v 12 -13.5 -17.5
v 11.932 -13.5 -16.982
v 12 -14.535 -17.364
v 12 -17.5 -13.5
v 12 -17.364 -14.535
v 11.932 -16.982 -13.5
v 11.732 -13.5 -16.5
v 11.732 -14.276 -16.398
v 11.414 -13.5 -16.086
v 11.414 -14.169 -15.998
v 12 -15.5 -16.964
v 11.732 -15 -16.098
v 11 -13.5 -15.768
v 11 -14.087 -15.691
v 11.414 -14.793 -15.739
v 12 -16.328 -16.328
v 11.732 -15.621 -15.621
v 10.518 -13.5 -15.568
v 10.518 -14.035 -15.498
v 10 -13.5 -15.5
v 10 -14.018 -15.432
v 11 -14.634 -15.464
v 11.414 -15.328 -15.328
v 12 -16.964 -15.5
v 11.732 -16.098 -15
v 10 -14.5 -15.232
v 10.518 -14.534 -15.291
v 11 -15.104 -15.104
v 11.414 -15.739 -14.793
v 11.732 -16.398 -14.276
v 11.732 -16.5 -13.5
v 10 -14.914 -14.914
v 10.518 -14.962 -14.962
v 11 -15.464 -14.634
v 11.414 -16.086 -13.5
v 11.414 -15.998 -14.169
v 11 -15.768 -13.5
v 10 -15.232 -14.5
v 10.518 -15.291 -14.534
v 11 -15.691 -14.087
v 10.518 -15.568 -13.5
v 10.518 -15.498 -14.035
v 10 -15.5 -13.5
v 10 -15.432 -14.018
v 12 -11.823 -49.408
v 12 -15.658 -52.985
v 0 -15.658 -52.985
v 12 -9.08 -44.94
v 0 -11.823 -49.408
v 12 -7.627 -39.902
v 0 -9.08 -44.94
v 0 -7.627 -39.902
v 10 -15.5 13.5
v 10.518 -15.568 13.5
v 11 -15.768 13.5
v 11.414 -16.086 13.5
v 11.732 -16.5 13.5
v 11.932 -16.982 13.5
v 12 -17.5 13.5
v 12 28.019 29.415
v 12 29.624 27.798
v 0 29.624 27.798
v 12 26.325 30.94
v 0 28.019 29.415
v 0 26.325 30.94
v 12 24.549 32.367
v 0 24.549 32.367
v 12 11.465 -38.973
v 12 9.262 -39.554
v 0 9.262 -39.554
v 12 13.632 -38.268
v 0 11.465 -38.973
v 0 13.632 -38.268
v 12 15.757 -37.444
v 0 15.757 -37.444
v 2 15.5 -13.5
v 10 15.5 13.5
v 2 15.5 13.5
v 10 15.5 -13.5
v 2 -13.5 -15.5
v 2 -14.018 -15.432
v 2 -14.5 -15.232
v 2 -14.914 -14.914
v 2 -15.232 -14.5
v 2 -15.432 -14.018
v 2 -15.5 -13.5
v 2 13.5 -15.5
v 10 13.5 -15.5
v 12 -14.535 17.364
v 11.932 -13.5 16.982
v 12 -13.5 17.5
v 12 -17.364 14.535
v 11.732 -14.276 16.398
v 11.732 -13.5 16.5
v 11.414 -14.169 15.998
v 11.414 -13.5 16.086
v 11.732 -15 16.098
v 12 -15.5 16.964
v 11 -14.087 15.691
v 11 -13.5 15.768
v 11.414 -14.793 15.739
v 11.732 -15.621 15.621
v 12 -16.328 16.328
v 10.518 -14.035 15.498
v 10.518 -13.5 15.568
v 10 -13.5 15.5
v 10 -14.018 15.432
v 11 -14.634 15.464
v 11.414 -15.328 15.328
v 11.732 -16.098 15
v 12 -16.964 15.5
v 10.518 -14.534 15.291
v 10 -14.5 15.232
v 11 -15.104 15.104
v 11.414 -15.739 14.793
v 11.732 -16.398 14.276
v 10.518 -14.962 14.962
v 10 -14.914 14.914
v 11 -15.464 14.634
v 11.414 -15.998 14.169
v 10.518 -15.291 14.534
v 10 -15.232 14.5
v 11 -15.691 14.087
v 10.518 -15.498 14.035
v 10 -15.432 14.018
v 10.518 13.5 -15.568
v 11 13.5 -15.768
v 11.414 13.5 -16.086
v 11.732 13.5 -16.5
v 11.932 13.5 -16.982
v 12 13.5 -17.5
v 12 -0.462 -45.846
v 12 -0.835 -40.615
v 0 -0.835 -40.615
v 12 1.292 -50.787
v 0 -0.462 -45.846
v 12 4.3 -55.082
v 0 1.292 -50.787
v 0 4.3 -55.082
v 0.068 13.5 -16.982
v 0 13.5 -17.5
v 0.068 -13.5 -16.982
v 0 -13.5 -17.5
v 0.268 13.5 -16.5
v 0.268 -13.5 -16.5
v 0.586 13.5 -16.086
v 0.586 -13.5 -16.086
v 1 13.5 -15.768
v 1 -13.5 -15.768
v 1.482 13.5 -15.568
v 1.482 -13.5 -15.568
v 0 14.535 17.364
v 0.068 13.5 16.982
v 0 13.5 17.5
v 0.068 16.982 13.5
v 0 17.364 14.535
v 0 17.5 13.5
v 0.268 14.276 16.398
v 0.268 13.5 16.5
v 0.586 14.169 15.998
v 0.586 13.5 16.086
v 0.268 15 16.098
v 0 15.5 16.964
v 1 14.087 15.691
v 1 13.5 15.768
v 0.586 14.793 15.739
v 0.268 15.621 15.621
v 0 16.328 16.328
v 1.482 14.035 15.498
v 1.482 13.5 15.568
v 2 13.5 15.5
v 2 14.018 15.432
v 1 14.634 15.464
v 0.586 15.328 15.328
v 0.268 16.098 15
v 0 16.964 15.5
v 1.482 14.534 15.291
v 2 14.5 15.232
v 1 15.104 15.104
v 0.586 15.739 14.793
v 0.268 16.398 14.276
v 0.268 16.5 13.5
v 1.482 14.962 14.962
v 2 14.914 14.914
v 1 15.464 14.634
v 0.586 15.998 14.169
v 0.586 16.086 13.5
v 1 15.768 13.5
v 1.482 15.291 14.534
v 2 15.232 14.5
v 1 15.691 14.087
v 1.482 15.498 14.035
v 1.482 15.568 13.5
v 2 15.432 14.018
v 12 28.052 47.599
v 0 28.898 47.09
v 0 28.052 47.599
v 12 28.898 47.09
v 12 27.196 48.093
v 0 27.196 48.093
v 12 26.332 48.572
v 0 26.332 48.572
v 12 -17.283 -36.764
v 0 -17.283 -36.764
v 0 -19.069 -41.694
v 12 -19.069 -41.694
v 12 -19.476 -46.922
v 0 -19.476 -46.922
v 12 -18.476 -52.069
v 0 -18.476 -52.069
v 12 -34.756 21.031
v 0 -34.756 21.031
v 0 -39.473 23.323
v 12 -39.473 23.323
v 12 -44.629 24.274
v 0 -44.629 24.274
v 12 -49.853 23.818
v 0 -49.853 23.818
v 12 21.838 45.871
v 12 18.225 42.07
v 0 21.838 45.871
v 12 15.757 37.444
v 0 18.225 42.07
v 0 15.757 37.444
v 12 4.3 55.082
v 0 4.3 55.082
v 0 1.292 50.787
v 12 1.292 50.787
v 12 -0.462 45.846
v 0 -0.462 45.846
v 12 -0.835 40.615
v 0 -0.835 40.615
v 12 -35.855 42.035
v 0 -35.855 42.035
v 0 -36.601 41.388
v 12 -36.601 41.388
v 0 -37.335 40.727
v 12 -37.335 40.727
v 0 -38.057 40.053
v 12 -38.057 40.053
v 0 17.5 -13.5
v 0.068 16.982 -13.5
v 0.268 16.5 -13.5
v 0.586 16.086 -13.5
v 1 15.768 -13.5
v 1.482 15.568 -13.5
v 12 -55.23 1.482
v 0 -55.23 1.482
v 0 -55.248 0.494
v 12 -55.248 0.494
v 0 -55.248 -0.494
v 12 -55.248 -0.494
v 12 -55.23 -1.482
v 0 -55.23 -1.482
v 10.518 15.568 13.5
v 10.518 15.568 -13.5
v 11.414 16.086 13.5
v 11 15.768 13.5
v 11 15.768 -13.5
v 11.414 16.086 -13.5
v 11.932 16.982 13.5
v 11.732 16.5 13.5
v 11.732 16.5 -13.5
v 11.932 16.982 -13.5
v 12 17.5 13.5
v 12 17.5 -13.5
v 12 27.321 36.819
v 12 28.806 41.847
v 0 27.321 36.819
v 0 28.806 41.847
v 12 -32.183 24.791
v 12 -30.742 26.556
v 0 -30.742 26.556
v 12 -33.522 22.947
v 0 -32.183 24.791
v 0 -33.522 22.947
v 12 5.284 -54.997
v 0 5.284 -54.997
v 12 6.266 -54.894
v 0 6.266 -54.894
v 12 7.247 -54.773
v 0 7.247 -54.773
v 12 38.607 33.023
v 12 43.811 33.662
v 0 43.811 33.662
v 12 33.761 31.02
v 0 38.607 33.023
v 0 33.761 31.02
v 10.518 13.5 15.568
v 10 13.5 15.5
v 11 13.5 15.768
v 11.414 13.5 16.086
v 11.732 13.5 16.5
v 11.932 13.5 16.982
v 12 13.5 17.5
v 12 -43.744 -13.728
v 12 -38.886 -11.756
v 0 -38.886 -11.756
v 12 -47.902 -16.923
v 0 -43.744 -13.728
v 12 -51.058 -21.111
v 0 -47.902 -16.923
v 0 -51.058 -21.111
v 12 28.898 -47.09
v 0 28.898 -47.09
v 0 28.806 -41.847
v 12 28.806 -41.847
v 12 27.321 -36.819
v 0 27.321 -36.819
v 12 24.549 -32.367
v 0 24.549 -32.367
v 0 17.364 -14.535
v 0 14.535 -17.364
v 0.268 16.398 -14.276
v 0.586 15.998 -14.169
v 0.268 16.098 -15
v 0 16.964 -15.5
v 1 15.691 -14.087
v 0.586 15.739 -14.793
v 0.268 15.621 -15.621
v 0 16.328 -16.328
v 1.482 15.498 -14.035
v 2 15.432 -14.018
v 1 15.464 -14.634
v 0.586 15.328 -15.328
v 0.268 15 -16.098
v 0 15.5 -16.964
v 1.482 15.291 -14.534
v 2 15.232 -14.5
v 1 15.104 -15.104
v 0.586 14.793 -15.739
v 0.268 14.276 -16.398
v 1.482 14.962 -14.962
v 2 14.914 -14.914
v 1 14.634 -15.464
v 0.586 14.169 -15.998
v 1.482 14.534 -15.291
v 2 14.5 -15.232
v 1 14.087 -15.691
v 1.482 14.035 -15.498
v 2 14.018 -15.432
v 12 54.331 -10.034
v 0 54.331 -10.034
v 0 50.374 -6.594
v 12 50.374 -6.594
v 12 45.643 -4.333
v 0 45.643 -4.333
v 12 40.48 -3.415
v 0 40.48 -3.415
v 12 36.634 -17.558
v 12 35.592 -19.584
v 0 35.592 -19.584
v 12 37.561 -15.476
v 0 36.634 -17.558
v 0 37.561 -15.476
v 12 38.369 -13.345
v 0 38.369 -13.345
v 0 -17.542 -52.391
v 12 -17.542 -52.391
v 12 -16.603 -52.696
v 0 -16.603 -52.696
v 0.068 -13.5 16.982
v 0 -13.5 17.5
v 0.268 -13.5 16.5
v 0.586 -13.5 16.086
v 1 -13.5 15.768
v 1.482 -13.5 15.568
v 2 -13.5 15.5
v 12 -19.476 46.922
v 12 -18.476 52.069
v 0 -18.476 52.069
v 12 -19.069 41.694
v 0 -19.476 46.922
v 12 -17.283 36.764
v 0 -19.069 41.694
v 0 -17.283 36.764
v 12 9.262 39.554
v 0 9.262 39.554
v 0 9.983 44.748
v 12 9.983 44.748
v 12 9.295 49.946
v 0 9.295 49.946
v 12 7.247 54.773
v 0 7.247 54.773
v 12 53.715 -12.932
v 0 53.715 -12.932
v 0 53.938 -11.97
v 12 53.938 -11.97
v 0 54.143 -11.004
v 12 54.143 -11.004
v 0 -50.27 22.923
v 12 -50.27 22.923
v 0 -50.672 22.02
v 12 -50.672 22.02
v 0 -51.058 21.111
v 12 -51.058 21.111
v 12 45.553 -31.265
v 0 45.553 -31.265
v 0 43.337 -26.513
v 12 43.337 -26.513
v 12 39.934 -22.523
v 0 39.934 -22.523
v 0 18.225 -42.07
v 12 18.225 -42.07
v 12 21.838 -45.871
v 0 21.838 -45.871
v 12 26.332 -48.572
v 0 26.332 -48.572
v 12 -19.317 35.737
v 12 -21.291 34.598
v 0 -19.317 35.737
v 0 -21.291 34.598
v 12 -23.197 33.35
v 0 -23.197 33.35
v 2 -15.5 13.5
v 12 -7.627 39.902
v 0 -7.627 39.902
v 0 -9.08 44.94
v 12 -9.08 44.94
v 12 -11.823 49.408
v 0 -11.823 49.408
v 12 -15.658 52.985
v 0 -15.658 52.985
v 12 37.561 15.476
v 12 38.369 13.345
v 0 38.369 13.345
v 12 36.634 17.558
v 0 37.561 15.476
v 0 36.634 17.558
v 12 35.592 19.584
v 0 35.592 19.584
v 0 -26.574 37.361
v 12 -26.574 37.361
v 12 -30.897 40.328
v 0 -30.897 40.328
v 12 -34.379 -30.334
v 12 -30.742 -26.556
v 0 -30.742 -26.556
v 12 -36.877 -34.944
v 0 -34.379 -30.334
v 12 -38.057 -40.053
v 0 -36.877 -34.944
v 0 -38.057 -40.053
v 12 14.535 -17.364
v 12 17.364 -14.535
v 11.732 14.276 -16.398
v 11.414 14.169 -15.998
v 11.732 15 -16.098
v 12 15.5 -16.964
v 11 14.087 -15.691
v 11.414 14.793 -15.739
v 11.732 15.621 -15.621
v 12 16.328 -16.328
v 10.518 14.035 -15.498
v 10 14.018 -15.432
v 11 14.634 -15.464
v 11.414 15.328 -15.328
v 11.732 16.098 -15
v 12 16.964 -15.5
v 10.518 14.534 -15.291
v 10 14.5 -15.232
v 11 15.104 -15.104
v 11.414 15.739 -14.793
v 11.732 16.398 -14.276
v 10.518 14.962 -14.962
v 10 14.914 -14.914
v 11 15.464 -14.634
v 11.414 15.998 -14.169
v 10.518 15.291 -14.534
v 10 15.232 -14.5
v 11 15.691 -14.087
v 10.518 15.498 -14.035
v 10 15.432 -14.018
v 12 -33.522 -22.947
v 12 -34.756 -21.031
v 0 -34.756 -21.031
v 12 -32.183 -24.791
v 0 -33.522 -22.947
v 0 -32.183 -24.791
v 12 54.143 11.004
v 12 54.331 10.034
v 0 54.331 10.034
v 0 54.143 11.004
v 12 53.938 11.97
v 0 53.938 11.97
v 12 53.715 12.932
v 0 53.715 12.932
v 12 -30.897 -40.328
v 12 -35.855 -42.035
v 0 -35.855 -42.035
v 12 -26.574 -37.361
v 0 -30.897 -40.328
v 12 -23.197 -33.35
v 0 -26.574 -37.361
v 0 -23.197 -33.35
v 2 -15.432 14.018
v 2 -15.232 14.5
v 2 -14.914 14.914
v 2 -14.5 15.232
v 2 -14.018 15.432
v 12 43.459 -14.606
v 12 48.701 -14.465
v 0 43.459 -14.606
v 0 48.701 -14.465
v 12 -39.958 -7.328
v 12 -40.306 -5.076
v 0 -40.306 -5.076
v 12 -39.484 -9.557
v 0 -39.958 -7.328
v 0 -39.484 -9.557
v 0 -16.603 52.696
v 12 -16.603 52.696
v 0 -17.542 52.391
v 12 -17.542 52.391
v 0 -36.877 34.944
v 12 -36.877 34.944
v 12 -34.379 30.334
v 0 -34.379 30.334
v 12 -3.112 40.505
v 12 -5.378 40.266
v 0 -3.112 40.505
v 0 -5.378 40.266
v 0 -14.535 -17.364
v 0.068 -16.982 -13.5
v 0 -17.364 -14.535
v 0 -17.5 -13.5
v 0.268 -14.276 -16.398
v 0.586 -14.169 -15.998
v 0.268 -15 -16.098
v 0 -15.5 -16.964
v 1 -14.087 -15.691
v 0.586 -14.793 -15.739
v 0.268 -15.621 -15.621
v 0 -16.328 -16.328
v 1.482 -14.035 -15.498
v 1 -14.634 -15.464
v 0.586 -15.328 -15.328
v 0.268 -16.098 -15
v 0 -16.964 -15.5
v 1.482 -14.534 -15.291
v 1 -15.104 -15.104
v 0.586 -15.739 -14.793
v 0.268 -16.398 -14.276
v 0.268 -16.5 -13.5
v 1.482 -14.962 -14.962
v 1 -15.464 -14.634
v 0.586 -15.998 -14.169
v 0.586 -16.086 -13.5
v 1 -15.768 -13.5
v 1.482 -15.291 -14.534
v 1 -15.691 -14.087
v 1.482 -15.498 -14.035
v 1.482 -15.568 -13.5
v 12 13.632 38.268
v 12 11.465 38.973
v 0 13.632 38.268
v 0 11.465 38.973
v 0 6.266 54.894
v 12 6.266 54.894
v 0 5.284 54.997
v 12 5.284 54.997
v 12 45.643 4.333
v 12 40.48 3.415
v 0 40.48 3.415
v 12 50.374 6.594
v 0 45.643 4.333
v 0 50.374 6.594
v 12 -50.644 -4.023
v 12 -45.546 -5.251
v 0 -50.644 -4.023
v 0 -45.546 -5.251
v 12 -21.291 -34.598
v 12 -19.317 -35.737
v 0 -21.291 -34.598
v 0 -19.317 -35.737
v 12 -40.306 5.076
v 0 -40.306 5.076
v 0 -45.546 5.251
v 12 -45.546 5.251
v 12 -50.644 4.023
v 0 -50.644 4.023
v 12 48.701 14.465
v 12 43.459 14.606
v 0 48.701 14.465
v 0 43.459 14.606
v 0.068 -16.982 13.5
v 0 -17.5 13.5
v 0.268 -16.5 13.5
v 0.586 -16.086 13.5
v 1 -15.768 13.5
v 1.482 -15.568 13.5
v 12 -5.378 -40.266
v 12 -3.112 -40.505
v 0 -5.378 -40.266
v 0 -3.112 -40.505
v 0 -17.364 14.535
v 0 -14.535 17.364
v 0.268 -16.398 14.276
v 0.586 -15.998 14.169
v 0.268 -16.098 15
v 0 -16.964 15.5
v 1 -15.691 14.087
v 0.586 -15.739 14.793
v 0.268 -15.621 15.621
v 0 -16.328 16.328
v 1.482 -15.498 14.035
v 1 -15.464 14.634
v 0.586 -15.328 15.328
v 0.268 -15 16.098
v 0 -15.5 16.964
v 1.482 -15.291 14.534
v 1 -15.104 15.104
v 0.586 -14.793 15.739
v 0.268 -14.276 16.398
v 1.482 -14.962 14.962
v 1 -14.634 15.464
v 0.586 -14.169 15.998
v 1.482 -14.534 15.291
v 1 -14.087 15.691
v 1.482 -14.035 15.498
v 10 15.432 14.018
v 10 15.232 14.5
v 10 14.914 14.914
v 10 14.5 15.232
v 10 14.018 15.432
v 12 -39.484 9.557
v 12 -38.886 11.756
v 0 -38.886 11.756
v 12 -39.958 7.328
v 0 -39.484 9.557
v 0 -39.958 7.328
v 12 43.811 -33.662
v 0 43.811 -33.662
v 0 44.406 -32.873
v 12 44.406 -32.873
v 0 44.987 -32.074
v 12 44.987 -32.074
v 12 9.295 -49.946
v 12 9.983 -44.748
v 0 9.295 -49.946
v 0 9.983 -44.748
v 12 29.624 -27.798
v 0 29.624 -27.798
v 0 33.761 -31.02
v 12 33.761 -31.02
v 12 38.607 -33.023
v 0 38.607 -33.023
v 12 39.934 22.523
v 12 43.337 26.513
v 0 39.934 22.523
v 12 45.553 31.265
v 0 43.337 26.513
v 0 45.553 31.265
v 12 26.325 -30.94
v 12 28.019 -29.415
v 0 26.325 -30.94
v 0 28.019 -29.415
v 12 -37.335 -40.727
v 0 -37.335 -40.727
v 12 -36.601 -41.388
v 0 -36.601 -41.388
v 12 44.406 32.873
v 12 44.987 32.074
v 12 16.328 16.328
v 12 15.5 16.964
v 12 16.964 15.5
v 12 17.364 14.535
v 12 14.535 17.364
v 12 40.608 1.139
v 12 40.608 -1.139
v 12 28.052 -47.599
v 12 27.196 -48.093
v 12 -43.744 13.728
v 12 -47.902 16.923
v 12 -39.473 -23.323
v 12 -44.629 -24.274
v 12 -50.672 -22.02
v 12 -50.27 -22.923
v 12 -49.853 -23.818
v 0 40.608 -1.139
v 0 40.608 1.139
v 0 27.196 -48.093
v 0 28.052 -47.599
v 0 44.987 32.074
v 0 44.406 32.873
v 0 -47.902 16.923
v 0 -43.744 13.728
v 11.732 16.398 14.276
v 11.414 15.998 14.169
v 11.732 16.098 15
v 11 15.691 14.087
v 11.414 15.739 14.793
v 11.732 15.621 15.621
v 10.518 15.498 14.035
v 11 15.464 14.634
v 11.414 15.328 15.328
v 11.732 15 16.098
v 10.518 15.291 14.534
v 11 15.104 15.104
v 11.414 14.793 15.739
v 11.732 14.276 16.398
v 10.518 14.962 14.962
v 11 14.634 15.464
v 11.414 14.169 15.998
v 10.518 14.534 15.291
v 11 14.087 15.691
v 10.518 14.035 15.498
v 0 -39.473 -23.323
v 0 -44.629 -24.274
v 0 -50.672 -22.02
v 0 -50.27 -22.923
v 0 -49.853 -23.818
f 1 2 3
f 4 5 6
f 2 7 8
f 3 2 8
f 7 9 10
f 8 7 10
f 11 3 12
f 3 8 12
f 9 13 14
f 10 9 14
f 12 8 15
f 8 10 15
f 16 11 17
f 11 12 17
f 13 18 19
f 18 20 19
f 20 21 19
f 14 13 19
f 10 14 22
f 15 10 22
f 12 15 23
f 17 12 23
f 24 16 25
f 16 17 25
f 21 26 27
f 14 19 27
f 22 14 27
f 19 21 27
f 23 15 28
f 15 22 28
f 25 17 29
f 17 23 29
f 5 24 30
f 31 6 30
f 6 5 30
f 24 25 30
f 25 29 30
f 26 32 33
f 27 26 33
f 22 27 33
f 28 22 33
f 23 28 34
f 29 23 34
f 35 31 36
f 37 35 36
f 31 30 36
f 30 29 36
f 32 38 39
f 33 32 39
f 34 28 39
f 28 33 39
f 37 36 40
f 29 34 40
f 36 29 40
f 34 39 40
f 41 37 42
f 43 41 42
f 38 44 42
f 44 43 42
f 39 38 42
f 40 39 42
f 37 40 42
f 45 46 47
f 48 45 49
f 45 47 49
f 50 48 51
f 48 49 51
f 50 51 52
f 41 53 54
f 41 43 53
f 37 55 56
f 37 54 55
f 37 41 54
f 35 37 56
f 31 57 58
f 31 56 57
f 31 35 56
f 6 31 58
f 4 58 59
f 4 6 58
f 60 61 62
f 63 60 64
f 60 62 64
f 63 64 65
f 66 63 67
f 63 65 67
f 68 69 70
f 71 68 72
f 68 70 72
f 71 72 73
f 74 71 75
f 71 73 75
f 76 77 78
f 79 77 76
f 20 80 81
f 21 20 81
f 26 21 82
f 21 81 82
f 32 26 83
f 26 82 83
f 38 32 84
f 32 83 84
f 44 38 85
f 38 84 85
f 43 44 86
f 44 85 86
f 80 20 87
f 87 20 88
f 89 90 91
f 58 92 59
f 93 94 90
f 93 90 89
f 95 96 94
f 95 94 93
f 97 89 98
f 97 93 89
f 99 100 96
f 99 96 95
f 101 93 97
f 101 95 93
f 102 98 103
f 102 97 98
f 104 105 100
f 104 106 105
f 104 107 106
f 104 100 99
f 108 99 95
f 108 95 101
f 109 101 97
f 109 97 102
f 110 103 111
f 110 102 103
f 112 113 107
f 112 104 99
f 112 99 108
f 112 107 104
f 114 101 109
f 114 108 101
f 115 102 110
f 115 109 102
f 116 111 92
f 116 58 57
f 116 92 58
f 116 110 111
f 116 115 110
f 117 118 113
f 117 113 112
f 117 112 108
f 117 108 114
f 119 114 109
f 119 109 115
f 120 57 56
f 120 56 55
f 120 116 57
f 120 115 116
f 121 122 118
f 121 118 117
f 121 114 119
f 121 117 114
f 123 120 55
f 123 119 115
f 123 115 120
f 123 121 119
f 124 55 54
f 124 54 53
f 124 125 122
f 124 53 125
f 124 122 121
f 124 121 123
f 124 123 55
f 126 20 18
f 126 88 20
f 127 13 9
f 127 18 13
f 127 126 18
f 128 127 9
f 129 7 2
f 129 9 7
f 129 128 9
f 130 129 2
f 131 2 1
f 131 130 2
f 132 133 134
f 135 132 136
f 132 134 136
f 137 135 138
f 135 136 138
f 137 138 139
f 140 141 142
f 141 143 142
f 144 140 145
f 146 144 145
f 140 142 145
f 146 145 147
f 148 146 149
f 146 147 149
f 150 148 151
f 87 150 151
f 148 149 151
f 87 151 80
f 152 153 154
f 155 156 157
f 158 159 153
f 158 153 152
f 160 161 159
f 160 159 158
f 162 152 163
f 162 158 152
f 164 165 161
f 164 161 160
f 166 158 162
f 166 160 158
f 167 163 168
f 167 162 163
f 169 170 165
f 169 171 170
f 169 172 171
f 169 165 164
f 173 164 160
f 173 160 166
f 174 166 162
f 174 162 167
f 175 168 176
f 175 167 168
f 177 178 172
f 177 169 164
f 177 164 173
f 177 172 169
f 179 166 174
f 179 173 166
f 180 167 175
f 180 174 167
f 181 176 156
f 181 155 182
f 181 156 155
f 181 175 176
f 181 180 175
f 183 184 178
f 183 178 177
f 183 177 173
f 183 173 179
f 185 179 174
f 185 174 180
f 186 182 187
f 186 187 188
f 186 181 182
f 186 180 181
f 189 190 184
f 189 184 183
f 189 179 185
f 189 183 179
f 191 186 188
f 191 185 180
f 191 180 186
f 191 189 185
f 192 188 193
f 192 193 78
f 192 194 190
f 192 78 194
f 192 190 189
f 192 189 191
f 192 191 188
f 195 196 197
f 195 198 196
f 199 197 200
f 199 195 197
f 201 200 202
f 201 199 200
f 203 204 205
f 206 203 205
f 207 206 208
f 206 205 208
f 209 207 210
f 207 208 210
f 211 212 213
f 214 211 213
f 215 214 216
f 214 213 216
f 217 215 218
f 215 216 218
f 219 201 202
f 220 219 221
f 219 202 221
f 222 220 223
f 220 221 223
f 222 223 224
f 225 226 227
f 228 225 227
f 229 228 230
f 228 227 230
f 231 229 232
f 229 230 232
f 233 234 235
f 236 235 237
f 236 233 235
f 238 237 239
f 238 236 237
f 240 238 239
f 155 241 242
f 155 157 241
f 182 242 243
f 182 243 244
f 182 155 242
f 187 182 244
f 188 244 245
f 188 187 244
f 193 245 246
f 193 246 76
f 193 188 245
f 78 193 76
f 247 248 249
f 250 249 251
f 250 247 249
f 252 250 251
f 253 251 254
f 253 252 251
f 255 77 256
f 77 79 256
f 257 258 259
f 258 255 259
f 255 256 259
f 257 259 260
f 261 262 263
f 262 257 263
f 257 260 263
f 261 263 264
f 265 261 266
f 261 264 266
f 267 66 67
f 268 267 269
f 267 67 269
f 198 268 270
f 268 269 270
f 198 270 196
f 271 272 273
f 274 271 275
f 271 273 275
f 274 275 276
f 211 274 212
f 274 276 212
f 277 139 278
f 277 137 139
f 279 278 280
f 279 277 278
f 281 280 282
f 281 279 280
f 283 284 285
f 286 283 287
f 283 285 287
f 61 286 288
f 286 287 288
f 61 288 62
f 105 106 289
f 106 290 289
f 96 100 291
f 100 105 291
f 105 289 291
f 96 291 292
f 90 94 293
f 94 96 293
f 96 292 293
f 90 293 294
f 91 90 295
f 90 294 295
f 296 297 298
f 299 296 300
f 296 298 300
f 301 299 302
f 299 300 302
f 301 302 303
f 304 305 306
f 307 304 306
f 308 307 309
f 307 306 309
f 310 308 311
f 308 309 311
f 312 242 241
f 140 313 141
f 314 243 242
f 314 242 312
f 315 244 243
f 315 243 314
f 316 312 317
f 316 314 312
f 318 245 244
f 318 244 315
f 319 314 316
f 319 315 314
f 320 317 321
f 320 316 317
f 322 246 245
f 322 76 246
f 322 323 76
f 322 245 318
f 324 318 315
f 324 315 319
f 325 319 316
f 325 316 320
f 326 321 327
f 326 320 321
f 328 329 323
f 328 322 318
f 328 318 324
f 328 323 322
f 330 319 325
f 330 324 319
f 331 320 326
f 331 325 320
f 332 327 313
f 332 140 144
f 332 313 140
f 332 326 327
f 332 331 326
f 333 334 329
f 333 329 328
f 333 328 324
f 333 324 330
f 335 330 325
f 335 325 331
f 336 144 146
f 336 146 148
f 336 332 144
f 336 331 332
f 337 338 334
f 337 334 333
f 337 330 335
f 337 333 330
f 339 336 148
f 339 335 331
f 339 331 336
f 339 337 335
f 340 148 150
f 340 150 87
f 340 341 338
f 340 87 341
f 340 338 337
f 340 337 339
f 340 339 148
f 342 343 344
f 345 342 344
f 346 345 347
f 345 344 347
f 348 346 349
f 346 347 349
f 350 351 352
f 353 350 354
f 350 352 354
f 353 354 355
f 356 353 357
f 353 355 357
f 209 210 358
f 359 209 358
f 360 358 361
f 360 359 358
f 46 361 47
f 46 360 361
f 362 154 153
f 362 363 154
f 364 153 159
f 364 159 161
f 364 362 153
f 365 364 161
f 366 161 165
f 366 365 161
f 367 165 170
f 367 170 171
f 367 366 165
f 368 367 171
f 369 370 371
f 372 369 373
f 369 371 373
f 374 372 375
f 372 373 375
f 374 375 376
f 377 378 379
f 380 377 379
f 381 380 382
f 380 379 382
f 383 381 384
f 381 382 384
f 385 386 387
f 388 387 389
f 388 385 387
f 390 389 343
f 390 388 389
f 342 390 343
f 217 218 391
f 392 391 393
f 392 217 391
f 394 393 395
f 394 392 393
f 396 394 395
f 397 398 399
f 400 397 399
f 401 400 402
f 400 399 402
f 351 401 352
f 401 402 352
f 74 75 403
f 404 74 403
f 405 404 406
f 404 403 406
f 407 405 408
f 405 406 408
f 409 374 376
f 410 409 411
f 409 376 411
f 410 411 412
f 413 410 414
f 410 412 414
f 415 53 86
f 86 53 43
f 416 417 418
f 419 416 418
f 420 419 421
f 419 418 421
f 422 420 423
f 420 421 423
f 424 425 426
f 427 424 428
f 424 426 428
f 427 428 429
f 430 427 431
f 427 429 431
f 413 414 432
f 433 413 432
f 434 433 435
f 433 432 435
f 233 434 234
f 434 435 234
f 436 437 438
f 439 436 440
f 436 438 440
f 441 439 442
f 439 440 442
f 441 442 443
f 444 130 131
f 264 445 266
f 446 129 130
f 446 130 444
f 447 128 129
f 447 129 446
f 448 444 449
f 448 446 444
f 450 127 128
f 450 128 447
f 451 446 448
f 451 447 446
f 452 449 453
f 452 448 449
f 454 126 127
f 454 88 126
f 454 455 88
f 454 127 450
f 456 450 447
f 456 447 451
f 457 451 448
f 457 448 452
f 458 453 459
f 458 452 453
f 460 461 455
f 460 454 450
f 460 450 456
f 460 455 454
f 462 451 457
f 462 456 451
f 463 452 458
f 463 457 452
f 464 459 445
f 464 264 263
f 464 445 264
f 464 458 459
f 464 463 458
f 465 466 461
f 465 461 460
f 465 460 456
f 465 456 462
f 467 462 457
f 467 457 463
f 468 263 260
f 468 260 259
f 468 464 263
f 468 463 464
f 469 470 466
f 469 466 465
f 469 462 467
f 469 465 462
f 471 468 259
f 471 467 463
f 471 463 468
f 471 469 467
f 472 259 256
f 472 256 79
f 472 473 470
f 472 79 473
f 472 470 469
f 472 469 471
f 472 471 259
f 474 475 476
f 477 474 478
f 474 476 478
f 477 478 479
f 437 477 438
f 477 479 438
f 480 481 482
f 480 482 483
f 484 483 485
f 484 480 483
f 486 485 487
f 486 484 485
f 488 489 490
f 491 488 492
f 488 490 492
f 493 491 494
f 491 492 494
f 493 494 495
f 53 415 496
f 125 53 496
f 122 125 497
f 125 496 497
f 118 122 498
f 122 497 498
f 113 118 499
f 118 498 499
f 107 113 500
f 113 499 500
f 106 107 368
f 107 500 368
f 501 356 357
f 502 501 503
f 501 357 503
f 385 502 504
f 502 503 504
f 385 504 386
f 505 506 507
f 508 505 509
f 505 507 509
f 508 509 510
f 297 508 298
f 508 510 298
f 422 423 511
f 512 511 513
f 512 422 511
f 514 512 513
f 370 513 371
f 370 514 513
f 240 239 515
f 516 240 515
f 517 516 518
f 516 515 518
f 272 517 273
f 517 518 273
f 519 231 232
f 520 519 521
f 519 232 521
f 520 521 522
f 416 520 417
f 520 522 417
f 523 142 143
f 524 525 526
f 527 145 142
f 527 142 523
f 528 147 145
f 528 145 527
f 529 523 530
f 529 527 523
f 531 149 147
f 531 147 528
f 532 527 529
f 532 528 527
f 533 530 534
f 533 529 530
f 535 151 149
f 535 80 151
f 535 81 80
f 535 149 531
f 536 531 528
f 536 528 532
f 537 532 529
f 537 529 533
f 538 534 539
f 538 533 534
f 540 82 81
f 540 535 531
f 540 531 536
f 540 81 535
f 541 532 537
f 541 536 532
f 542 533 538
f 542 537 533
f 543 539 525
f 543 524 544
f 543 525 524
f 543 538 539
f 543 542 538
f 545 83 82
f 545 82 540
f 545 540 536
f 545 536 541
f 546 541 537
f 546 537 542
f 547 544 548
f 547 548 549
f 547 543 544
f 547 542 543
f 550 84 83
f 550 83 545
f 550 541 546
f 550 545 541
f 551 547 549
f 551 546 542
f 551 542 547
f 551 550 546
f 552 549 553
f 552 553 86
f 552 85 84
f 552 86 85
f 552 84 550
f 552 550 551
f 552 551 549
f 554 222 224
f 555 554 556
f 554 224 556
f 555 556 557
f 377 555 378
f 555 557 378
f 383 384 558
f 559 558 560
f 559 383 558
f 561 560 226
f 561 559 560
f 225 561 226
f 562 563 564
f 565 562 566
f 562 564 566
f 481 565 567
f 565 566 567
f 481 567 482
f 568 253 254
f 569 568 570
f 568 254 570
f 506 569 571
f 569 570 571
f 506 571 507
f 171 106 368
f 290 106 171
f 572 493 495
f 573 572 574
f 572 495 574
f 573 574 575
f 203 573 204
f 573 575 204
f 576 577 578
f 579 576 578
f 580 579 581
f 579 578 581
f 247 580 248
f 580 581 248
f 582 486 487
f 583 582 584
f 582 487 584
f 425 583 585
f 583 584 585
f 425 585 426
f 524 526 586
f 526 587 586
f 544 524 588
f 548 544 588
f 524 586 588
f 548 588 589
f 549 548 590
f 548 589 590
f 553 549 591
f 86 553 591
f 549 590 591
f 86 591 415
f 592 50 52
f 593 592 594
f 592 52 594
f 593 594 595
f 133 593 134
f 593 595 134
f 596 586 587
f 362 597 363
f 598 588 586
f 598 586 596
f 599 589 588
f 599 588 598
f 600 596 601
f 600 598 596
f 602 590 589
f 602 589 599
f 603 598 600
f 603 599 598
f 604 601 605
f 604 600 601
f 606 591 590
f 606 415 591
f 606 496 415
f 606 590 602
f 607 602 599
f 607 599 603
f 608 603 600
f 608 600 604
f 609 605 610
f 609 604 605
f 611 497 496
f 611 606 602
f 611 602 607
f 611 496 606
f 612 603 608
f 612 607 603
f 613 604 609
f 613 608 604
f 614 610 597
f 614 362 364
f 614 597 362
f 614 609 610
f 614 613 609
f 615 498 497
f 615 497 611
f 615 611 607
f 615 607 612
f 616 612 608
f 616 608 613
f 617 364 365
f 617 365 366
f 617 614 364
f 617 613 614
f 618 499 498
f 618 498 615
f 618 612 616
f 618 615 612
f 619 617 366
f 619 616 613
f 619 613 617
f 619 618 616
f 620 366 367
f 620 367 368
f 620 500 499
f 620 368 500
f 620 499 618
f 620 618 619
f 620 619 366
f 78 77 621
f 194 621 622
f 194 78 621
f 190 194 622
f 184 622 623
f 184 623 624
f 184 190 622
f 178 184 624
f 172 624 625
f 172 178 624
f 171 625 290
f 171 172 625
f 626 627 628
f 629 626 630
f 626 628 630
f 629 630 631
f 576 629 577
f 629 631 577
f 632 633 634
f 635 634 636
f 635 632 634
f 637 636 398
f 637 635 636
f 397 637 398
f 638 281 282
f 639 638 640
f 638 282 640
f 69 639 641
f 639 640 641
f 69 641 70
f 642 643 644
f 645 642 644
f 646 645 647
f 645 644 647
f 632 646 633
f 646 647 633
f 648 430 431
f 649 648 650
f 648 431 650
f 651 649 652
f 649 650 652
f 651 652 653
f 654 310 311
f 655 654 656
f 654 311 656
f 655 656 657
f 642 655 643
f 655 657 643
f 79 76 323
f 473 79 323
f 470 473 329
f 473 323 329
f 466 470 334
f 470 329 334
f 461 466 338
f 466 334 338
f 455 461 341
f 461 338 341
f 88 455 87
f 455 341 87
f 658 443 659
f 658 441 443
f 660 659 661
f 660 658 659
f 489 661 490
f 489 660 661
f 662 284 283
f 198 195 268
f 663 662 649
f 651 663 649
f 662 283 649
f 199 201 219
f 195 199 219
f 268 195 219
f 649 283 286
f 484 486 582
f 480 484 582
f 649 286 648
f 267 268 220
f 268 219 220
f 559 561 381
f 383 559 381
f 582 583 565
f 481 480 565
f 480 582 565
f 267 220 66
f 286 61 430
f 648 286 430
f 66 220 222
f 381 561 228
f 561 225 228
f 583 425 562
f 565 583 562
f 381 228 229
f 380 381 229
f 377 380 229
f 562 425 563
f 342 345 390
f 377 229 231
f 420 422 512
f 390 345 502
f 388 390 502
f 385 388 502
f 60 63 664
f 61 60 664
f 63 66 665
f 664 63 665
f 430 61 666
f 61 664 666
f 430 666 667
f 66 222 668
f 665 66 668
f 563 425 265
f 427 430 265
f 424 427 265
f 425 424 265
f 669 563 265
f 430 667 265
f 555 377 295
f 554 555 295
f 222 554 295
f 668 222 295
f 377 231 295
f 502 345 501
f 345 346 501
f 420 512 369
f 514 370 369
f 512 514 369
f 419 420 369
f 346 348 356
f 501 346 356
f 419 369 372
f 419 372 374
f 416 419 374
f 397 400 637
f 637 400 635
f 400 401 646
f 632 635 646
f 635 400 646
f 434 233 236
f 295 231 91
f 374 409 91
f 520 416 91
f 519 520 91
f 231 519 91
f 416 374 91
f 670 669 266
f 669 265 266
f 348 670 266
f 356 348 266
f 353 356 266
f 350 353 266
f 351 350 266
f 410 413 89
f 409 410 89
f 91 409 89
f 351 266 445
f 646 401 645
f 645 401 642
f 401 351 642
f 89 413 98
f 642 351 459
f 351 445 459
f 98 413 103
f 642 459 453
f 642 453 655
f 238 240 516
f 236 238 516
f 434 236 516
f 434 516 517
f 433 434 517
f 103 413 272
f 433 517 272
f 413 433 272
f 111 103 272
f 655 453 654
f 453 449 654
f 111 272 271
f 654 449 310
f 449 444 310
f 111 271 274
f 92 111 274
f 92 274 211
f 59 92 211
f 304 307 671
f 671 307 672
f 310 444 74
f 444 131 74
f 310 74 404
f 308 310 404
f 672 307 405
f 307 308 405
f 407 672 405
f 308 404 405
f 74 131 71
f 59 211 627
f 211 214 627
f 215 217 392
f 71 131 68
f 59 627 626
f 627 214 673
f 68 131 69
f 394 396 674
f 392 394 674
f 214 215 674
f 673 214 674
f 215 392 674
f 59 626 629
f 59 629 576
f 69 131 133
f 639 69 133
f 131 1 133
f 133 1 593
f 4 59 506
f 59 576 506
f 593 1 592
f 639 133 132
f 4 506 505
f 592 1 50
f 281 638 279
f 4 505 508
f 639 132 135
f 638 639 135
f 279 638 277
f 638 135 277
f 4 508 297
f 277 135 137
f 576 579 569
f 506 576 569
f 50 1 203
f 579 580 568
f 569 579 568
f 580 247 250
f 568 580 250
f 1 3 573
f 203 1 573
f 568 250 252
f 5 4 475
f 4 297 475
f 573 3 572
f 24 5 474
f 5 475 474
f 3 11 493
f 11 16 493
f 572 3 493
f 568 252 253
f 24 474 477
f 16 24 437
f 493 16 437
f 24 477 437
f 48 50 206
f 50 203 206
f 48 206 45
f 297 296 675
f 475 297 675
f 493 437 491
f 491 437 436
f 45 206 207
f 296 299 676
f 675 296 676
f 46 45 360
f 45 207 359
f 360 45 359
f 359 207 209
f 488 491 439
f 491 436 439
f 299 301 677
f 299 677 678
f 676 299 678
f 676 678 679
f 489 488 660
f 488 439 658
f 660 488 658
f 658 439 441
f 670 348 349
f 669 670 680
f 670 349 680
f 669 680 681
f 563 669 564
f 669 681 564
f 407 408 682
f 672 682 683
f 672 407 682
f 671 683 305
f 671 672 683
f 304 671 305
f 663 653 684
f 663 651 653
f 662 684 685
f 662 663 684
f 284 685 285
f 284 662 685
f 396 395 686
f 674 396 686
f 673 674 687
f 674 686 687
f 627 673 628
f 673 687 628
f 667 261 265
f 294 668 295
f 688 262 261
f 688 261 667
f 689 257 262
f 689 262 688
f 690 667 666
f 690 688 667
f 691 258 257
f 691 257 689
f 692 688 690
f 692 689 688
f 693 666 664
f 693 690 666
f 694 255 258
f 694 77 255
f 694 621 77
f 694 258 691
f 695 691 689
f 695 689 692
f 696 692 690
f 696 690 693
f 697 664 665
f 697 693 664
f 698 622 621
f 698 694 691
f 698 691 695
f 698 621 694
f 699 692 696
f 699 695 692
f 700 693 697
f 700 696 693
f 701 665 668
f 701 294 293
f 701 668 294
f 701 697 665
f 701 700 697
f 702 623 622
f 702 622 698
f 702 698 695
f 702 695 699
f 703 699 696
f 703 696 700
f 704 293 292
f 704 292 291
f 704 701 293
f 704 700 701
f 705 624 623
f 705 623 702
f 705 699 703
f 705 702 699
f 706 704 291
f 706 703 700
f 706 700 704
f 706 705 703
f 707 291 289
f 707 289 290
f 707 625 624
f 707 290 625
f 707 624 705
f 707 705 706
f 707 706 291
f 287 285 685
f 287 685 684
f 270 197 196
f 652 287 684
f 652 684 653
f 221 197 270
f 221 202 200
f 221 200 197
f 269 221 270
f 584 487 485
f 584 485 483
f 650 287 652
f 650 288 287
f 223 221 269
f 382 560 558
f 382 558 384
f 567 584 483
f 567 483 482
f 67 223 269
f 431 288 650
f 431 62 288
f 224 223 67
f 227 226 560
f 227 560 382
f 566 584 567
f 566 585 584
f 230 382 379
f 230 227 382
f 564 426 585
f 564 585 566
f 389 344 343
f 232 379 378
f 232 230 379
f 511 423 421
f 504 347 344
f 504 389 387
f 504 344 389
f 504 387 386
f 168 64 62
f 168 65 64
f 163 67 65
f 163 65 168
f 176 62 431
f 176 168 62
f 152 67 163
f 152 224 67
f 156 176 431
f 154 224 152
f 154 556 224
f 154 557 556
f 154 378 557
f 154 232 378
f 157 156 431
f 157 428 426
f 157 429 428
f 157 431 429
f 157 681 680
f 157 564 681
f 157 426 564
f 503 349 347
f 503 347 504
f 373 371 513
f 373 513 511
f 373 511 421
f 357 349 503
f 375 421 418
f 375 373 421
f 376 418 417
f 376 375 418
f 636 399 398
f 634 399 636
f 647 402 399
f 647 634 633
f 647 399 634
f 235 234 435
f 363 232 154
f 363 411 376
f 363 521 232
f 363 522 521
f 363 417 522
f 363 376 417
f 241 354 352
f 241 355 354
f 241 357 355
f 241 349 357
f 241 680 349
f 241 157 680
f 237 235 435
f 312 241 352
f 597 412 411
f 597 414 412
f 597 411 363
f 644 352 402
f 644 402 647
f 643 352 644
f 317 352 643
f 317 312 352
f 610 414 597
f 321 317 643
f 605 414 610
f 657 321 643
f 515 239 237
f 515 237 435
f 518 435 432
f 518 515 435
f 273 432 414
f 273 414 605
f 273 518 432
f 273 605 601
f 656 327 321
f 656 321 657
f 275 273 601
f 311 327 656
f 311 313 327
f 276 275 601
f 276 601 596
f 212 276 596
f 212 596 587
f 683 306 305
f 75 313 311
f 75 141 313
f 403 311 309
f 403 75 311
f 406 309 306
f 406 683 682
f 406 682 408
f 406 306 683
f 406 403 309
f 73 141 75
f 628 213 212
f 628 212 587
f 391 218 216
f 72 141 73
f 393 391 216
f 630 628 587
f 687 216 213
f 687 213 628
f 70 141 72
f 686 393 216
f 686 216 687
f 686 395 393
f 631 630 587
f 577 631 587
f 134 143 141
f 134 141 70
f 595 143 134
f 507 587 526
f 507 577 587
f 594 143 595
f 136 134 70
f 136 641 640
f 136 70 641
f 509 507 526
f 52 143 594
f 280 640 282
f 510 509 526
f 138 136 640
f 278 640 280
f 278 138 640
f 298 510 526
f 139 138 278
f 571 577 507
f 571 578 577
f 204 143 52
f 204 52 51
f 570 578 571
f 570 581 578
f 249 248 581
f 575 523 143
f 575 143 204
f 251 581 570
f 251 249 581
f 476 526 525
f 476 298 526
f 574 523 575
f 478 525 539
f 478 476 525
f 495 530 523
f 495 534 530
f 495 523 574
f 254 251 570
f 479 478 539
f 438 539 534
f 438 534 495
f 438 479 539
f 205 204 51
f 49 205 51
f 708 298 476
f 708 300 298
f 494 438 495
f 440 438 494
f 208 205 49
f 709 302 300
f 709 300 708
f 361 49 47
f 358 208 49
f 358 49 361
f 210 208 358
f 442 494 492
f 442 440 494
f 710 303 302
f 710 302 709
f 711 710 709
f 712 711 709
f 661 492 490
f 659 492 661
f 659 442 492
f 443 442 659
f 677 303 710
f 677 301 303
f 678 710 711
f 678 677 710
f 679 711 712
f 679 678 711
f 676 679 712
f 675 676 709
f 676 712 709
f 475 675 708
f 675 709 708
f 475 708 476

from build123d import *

# Parameters (mm, degrees)
BASPROSKE_W        = 12
BASPROSKE_H        = 55.25
TOOTHCUT_DEPTH     = 80.051407325
TEETHCUTS_COUNT    = 15
TEETHCUTS_ANGLE    = 336
BORSKE_R           = 10
BORE_DEPTH         = 50.0000508
SKETCH1_W          = 31
SKETCH1_H          = 31
CUT_EXTRUDE2_DEPTH = 79.934396957
FILLET1_R          = 2


with BuildPart() as part:
    # BasProSke → Base-Revolve (revolve)
    with BuildSketch(Plane(origin=(0, 0, 0), x_dir=(1, 0, 0), z_dir=(0, 1, 0)), mode=Mode.PRIVATE) as base_revolve_sk:
        with Locations((6, 27.625)):
            Rectangle(BASPROSKE_W, BASPROSKE_H)
    revolve(base_revolve_sk.sketch.rotate(Axis((-10, 0, 0), (1, 0, 0)), 180), axis=Axis((-10, 0, 0), (1, 0, 0)))

    # TooCutSke → ToothCut (cut, through all)
    with BuildSketch(Plane(origin=(0, 0, 0), x_dir=(0, 0, -1), z_dir=(1, 0, 0))):
        with BuildLine():
            ThreePointArc((3.414601006, 40.480240562), (0, 40.624), (-3.414601006, 40.480240562))
            ThreePointArc((-3.414601006, 40.480240562), (-5.310758866, 48.09911095), (-10.058002941, 54.352611915))
            ThreePointArc((-10.058002941, 54.352611915), (0, 55.2754), (10.058002941, 54.352611915))
            ThreePointArc((10.058002941, 54.352611915), (5.310758866, 48.09911095), (3.414601006, 40.480240562))
        make_face()
    toothcut = extrude(amount=TOOTHCUT_DEPTH, mode=Mode.SUBTRACT)

    # TeethCuts: ToothCut ×15 about axis
    teethcuts_axis = Axis((-10, 0, 0), (1, 0, 0))
    for i in range(1, TEETHCUTS_COUNT):
        add(toothcut.rotate(teethcuts_axis, i * TEETHCUTS_ANGLE / (TEETHCUTS_COUNT - 1)), mode=Mode.SUBTRACT)

    # BorSke → Bore (cut, symmetric)
    with BuildSketch(Plane(origin=(0, 0, 0), x_dir=(0, 0, -1), z_dir=(1, 0, 0))):
        with Locations(Location((0, 0, 0), (0, 0, 180))):
            Circle(BORSKE_R)
    extrude(amount=BORE_DEPTH, both=True, mode=Mode.SUBTRACT)

    # Sketch1 → Cut-Extrude2 (cut, through all)
    with BuildSketch(Plane(origin=(12, 0, 0), x_dir=(0, 0, -1), z_dir=(1, 0, 0))):
        Rectangle(SKETCH1_W, SKETCH1_H)
    extrude(amount=-CUT_EXTRUDE2_DEPTH, mode=Mode.SUBTRACT)

    # Fillet1
    fillet1_edges = [part.edges().sort_by_distance(p)[0] for p in [
        (0, 0, -15.5),
        (6, 15.5, -15.5),
        (0, -15.5, 0),
        (6, -15.5, -15.5),
        (0, 0, 15.5),
        (6, -15.5, 15.5),
        (0, 15.5, 0),
        (6, 15.5, 15.5),
        (12, 0, -15.5),
        (12, 15.5, 0),
        (12, 0, 15.5),
        (12, -15.5, 0),
    ]]
    fillet(fillet1_edges, radius=FILLET1_R)


solid = part.part
